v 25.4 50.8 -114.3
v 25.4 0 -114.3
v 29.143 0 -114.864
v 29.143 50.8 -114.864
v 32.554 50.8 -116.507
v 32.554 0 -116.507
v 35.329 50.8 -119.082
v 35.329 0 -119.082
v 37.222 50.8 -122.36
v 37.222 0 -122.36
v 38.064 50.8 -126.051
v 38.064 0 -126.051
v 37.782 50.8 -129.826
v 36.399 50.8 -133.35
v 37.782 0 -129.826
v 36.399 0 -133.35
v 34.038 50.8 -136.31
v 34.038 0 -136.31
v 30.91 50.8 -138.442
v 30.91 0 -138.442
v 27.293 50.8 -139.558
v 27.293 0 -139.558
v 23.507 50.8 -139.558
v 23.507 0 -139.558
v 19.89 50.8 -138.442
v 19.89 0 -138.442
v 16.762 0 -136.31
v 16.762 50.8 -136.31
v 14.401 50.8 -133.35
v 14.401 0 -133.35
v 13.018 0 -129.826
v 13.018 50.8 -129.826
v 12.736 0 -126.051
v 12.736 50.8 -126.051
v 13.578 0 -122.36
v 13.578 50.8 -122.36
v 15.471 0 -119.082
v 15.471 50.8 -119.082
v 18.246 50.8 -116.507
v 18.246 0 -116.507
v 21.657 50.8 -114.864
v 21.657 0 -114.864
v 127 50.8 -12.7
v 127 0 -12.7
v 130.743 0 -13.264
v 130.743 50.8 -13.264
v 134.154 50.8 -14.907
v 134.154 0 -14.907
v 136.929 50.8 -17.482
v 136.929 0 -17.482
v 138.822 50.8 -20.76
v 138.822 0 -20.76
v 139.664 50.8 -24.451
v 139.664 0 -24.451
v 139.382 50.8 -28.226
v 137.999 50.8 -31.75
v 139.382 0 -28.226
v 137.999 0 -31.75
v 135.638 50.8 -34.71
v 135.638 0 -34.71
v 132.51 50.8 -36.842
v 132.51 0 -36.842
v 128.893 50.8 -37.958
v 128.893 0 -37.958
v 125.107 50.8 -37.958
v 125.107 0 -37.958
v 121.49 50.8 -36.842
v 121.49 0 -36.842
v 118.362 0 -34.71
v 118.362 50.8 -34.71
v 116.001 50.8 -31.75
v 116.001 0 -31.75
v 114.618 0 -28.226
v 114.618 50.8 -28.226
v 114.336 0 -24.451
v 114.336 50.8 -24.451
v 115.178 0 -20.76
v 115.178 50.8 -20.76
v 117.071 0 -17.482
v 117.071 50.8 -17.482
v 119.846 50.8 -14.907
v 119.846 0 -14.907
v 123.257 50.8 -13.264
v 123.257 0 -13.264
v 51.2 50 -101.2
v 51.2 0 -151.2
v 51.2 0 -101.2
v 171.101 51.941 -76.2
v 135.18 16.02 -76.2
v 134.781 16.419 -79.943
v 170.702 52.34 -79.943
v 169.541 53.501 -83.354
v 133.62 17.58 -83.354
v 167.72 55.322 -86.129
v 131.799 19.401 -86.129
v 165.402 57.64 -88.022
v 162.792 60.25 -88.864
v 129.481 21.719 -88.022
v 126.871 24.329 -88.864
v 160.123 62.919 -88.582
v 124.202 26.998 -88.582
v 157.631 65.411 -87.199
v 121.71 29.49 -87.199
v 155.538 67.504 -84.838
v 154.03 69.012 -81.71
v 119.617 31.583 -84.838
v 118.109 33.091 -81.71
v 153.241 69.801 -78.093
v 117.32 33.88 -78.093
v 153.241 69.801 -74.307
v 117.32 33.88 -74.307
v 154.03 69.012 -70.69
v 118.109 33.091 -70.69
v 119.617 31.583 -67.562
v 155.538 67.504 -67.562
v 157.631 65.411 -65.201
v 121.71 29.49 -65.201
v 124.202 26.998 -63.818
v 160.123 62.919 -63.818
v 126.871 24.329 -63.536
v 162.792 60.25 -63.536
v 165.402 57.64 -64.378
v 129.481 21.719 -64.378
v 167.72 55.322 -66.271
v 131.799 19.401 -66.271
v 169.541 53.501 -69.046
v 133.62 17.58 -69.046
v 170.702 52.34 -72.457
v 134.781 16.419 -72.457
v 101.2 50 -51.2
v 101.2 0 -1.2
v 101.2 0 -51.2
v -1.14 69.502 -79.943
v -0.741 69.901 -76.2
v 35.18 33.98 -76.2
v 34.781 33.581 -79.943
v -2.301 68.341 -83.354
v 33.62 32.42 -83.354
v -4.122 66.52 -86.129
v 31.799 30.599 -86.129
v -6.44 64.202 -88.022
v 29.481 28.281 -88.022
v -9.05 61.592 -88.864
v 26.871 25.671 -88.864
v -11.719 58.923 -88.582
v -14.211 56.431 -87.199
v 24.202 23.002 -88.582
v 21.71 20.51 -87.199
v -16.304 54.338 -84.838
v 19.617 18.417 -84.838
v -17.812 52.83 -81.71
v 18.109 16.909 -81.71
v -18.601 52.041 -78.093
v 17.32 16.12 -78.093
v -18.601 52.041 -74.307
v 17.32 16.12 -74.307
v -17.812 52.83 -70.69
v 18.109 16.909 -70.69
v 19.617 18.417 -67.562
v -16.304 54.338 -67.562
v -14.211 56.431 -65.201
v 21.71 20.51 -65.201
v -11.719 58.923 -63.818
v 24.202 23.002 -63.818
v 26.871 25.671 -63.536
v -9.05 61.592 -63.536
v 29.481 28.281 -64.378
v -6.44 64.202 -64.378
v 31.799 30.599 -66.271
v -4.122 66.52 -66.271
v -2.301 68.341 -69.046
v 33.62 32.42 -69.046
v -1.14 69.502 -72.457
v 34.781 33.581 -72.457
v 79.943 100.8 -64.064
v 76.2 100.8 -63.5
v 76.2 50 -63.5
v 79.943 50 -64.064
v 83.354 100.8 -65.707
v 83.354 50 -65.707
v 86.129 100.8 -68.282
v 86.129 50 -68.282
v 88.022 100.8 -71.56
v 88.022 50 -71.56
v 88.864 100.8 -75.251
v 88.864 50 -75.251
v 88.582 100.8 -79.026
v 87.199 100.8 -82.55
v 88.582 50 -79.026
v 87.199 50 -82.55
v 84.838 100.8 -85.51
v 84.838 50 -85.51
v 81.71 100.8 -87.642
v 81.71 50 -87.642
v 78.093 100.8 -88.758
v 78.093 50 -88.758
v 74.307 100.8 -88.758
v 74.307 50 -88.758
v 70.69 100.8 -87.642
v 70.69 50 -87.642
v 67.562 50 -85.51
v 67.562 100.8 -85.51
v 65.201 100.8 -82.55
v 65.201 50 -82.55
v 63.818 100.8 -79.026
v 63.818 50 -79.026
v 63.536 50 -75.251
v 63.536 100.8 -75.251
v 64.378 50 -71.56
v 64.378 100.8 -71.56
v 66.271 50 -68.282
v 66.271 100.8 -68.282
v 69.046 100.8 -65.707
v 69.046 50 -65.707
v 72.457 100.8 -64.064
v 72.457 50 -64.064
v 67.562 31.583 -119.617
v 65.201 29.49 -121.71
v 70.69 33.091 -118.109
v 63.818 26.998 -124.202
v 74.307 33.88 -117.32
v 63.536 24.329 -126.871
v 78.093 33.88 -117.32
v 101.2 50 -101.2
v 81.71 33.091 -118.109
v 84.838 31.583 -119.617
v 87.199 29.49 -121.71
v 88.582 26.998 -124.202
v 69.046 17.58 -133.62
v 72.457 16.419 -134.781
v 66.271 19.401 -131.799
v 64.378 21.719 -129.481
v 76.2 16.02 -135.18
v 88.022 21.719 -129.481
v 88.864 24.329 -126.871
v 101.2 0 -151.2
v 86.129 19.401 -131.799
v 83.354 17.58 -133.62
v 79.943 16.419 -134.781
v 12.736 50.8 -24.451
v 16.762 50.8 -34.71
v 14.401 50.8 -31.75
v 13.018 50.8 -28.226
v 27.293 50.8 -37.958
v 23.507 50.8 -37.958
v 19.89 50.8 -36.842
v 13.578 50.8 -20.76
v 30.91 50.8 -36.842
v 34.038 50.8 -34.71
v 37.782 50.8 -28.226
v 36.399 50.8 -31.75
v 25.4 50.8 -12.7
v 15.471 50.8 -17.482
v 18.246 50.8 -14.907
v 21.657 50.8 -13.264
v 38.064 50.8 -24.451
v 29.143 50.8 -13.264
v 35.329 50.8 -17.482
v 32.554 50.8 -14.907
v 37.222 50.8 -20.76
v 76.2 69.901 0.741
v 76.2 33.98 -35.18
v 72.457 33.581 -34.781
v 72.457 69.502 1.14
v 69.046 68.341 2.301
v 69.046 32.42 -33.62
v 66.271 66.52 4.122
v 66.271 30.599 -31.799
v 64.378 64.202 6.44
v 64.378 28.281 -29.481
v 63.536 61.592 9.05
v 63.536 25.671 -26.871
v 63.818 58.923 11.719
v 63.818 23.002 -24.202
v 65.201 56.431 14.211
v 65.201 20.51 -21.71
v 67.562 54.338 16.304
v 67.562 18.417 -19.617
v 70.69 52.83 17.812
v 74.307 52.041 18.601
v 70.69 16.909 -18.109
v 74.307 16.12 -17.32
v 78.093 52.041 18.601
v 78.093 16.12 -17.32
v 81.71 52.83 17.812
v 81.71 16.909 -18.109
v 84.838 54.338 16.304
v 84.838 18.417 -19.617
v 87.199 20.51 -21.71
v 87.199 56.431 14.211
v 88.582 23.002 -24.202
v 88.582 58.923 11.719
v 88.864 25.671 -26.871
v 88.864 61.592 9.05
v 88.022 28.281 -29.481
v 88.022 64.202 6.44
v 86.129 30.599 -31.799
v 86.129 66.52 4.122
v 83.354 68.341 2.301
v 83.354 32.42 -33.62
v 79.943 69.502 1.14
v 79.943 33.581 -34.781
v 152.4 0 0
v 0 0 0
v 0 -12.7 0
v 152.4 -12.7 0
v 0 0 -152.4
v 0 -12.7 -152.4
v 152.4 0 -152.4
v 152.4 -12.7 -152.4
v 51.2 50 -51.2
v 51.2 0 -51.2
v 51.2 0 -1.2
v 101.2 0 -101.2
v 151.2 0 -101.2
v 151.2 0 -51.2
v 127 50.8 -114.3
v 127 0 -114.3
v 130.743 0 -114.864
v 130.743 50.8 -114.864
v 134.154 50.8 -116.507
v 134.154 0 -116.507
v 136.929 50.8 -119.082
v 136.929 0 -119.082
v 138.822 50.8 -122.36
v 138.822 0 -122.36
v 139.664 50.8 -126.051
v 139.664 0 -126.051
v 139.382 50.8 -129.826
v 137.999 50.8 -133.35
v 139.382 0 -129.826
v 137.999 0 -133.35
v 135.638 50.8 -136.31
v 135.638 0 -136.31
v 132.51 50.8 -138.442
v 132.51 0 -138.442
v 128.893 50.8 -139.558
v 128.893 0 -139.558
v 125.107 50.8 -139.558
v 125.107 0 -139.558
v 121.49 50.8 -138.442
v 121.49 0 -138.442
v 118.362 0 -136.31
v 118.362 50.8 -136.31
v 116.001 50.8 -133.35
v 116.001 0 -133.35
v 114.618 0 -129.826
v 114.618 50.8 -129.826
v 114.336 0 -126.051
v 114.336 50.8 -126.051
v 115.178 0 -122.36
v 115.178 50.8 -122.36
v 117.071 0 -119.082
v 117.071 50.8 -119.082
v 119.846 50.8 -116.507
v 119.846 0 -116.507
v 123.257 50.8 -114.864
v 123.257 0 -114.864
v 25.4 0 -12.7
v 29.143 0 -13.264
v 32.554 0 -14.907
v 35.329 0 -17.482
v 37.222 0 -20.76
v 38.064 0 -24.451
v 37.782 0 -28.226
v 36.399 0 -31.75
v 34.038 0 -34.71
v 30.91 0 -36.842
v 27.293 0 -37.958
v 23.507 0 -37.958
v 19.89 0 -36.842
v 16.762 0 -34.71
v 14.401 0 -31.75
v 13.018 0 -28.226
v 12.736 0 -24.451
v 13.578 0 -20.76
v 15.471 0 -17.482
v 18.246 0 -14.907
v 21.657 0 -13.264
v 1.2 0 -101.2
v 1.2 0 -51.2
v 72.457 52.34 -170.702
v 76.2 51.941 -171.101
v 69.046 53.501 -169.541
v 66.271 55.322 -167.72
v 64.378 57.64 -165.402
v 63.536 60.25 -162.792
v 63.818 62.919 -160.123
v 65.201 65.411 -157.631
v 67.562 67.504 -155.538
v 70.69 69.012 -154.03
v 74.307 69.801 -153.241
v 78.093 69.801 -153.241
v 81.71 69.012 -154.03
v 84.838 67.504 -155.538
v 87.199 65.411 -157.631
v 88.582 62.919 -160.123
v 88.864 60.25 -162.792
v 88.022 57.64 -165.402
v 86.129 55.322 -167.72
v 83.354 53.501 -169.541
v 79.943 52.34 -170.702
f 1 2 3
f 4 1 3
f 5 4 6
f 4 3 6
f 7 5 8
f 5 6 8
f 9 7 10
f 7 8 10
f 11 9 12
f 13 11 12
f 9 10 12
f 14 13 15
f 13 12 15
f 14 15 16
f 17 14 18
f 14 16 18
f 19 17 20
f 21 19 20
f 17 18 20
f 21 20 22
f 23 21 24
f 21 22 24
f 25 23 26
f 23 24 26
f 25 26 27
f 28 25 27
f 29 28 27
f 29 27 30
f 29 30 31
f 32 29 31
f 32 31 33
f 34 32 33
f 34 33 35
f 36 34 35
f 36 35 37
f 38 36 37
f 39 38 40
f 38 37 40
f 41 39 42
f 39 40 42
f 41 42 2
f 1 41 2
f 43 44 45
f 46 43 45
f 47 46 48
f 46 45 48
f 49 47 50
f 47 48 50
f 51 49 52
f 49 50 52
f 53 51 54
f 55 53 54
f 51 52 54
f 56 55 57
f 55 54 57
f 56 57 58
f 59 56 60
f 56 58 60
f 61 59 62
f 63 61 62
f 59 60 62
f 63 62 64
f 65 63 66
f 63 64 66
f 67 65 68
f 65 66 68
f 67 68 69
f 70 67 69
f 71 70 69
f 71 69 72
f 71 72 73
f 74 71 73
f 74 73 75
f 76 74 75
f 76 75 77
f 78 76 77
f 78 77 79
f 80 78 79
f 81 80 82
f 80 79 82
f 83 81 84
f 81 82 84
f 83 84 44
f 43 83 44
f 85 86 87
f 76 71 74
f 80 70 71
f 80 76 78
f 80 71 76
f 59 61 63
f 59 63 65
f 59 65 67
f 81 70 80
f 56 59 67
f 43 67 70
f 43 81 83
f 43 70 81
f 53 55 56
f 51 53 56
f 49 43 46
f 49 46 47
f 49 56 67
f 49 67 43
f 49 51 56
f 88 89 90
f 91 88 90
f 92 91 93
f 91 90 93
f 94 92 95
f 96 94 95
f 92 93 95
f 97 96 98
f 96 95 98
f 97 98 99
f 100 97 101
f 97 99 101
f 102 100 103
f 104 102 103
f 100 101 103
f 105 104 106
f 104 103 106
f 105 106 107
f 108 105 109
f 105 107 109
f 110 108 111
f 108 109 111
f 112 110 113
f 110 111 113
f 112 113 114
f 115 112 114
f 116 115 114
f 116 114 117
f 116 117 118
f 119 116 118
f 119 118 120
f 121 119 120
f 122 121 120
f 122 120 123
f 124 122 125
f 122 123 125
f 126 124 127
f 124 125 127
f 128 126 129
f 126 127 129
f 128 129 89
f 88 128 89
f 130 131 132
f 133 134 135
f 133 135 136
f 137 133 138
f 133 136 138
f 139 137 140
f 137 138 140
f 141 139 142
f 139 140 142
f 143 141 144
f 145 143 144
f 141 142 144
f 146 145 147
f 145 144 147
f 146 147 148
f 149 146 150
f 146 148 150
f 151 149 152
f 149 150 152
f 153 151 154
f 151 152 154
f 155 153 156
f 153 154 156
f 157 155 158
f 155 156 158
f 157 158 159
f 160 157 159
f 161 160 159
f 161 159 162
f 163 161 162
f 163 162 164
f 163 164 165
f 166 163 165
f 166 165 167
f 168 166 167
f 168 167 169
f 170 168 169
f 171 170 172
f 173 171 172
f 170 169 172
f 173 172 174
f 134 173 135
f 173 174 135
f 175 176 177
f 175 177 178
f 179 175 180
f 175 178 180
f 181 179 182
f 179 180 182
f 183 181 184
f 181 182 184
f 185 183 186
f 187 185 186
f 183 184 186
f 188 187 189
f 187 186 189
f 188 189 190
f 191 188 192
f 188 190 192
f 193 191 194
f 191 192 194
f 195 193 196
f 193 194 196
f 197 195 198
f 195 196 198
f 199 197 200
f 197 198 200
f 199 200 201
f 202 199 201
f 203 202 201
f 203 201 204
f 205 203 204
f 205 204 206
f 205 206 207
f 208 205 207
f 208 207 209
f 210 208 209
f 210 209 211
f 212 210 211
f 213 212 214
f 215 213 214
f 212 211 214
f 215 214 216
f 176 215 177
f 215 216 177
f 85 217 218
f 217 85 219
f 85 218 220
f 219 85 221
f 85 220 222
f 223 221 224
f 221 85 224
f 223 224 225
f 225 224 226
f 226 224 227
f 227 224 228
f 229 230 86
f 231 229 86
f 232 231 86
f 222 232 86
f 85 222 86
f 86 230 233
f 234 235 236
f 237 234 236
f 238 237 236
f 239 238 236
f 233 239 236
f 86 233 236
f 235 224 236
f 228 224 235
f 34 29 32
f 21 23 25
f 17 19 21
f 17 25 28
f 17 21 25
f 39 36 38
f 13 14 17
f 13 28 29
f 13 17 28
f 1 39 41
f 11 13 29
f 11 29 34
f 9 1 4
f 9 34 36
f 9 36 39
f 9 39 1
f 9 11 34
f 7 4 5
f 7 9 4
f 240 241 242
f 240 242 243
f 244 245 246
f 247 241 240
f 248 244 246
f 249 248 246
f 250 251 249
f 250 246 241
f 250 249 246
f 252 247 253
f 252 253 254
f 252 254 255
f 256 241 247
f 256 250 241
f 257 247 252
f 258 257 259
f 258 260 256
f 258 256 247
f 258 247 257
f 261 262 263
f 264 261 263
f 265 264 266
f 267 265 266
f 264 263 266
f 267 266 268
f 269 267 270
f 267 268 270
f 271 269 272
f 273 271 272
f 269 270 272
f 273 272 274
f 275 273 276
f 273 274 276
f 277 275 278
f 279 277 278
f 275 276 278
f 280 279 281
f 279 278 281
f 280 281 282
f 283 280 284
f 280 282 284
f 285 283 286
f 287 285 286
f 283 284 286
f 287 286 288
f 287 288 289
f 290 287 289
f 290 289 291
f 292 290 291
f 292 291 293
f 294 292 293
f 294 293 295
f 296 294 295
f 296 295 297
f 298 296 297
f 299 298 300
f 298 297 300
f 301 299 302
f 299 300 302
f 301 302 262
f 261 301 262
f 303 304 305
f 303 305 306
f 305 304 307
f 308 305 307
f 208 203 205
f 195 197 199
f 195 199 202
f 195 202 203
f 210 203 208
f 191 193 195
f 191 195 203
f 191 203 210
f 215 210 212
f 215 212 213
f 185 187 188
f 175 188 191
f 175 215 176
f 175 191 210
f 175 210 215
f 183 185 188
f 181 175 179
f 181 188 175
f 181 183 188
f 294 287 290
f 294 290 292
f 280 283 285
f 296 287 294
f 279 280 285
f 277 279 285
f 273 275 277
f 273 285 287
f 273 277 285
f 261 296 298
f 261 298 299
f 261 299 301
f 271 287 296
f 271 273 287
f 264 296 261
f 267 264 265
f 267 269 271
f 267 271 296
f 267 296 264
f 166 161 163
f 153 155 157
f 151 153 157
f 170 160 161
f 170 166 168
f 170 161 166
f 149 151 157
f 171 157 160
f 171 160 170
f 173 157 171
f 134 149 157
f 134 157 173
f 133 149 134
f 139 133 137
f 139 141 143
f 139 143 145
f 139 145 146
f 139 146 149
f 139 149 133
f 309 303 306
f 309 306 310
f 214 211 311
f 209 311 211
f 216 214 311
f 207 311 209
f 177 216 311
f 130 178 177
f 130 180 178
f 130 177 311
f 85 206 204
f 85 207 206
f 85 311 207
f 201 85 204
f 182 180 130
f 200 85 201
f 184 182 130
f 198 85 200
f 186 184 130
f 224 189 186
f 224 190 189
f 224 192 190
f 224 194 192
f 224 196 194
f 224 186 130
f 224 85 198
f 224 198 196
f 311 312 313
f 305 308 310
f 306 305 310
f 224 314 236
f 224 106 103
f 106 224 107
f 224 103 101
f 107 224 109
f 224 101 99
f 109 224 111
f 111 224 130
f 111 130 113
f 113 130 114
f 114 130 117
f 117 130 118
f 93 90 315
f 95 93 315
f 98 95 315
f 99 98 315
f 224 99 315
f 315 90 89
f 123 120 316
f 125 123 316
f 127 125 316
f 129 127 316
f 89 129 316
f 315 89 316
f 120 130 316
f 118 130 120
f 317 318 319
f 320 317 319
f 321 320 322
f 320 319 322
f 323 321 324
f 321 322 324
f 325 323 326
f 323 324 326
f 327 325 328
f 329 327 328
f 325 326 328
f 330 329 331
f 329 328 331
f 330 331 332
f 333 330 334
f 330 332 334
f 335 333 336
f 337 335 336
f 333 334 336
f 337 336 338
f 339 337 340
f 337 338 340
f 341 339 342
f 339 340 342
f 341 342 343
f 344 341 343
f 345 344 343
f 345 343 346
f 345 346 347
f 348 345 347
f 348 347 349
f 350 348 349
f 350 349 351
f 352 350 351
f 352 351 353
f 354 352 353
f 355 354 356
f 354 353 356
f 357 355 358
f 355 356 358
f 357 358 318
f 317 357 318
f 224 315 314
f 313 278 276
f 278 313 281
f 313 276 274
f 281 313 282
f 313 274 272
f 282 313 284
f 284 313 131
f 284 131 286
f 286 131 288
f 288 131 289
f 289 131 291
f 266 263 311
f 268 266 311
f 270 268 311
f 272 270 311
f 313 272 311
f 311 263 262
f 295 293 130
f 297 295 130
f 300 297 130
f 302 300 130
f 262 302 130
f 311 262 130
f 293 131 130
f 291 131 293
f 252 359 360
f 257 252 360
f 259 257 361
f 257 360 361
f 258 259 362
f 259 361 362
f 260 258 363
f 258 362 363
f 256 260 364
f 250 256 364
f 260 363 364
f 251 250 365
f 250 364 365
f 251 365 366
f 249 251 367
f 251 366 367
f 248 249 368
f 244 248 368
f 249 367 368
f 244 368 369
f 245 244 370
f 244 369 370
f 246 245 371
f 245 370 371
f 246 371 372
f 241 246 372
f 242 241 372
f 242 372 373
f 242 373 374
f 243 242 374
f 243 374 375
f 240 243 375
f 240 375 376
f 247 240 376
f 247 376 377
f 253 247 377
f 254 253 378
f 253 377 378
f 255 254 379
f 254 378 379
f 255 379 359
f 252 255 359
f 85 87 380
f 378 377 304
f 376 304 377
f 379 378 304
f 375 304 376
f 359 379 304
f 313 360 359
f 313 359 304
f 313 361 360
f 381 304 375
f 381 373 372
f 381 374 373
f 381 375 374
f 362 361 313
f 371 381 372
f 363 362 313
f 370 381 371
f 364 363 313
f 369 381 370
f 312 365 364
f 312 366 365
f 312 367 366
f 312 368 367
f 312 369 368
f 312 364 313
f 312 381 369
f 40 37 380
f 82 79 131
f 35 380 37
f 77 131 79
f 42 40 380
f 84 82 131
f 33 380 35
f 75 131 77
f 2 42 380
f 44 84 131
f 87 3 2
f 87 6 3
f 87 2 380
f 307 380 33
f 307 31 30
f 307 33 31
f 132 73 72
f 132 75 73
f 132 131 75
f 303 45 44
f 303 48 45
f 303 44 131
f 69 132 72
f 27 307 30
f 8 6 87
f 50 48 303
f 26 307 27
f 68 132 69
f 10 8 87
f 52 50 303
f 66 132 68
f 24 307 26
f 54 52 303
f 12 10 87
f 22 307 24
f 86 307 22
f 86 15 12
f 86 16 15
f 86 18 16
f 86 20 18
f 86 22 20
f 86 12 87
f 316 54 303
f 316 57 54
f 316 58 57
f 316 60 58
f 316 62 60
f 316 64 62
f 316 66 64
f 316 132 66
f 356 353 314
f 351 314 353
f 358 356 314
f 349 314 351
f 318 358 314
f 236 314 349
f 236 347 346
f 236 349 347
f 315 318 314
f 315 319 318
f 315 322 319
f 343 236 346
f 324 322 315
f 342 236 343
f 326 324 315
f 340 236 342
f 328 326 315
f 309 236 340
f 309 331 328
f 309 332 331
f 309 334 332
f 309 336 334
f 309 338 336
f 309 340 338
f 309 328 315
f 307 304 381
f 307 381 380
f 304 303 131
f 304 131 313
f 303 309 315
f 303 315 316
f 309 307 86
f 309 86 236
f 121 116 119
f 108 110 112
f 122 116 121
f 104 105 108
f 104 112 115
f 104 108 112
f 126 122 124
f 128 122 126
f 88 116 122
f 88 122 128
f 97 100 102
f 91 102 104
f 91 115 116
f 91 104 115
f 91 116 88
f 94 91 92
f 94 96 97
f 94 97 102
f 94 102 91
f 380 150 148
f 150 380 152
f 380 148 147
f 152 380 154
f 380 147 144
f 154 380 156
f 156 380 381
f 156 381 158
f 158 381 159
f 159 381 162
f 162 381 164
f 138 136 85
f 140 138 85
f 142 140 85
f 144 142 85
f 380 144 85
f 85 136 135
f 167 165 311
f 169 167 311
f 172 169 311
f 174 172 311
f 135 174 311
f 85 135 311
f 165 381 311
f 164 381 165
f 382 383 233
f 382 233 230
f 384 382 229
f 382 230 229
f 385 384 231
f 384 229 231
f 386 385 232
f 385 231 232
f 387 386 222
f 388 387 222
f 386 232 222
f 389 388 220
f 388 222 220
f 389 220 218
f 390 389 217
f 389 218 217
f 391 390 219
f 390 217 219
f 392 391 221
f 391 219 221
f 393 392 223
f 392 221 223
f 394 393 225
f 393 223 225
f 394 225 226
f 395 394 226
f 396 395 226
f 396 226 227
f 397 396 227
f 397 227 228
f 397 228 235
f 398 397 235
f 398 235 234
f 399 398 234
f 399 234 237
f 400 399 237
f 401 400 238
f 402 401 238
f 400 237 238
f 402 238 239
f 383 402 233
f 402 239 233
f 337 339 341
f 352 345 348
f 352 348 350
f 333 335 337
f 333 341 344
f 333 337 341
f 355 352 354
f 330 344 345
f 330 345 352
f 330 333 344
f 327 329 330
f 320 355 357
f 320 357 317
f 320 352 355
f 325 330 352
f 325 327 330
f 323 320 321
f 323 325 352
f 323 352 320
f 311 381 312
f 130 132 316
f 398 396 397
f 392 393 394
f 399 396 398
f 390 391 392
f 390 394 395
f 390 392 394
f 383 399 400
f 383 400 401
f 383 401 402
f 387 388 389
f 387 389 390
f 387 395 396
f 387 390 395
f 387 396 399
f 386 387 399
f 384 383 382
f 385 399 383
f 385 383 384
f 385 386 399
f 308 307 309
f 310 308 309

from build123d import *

# Parameters (mm, degrees)
SKETCH1_W           = 152.4
SKETCH1_H           = 152.4
BOSS_EXTRUDE1_DEPTH = 12.7
SKETCH2_R           = 12.7
BOSS_EXTRUDE2_DEPTH = 50.8
BOSS_EXTRUDE3_DEPTH = 50
CUT_EXTRUDE1_DEPTH  = 50
CUT_EXTRUDE2_DEPTH  = 50
SKETCH6_R           = 12.7
BOSS_EXTRUDE4_DEPTH = 50.8
SKETCH7_R           = 12.7
BOSS_EXTRUDE5_DEPTH = 50.8
SKETCH8_R           = 12.7
BOSS_EXTRUDE6_DEPTH = 50.8
SKETCH9_R           = 12.7
BOSS_EXTRUDE7_DEPTH = 50.8
SKETCH10_R          = 12.7
BOSS_EXTRUDE8_DEPTH = 50.8


with BuildPart() as part:
    # Sketch1 → Boss-Extrude1 (new body)
    with BuildSketch(Plane(origin=(0, 0, 0), x_dir=(1, 0, 0), z_dir=(0, 1, 0))):
        with Locations((76.2, 76.2)):
            Rectangle(SKETCH1_W, SKETCH1_H)
    extrude(amount=-BOSS_EXTRUDE1_DEPTH)

    # Sketch2 → Boss-Extrude2 (add)
    with BuildSketch(Plane(origin=(0, 0, 0), x_dir=(1, 0, 0), z_dir=(0, 1, 0))):
        with Locations(Location((25.4, 127, 0), (0, 0, 270))):
            Circle(SKETCH2_R)
        with Locations(Location((127, 127, 0), (0, 0, 270))):
            Circle(SKETCH2_R)
        with Locations(Location((127, 25.4, 0), (0, 0, 270))):
            Circle(SKETCH2_R)
        with Locations(Location((25.4, 25.4, 0), (0, 0, 270))):
            Circle(SKETCH2_R)
    extrude(amount=BOSS_EXTRUDE2_DEPTH)

    # Sketch3 → Boss-Extrude3 (add)
    with BuildSketch(Plane(origin=(0, 0, 0), x_dir=(1, 0, 0), z_dir=(0, 1, 0))):
        Polygon((51.2, 151.2), (51.2, 101.2), (1.2, 101.2), (1.2, 51.2), (51.2, 51.2), (51.2, 1.2), (101.2, 1.2), (101.2, 51.2), (151.2, 51.2), (151.2, 101.2), (101.2, 101.2), (101.2, 151.2), align=None)
    extrude(amount=BOSS_EXTRUDE3_DEPTH)

    # Sketch4 → Cut-Extrude1 (cut)
    with BuildSketch(Plane.XY.offset(-51.2)):
        Polygon((1.2, 0), (51.2, 50), (1.2, 50), align=None)
        Polygon((101.2, 50), (151.2, 0), (151.2, 50), align=None)
    extrude(amount=-CUT_EXTRUDE1_DEPTH, mode=Mode.SUBTRACT)

    # Sketch5 → Cut-Extrude2 (cut)
    with BuildSketch(Plane(origin=(101.2, 0, 0), x_dir=(0, 0, -1), z_dir=(1, 0, 0))):
        Polygon((1.2, 0), (51.2, 50), (1.2, 50), align=None)
        Polygon((101.2, 50), (151.2, 0), (151.2, 50), align=None)
    extrude(amount=-CUT_EXTRUDE2_DEPTH, mode=Mode.SUBTRACT)

    # Sketch6 → Boss-Extrude4 (add)
    with BuildSketch(Plane(origin=(75.6, 75.6, 0), x_dir=(0, 0, -1), z_dir=(0.7071067811865475, 0.7071067811865477, 0))):
        with Locations(Location((76.2, -71.559206256, 0), (0, 0, 270))):
            Circle(SKETCH6_R)
    extrude(amount=BOSS_EXTRUDE4_DEPTH)

    # Sketch7 → Boss-Extrude5 (add)
    with BuildSketch(Plane(origin=(0, 75.6, -75.6), x_dir=(1, 0, 0), z_dir=(0, 0.7071067811865476, -0.7071067811865475))):
        with Locations(Location((76.2, 71.559206256, 0), (0, 0, 90))):
            Circle(SKETCH7_R)
    extrude(amount=BOSS_EXTRUDE5_DEPTH)

    # Sketch8 → Boss-Extrude6 (add)
    with BuildSketch(Plane(origin=(0.6, -0.6, 0), x_dir=(0, 0, 1), z_dir=(-0.7071067811865476, 0.7071067811865475, 0))):
        with Locations(Location((-76.2, 36.203867197, 0), (0, 0, 90))):
            Circle(SKETCH8_R)
    extrude(amount=BOSS_EXTRUDE6_DEPTH)

    # Sketch9 → Boss-Extrude7 (add)
    with BuildSketch(Plane(origin=(0, -0.6, -0.6), x_dir=(1, 0, 0), z_dir=(0, 0.7071067811865477, 0.7071067811865475))):
        with Locations(Location((76.2, 36.203867197, 0), (0, 0, 90))):
            Circle(SKETCH9_R)
    extrude(amount=BOSS_EXTRUDE7_DEPTH)

    # Sketch10 → Boss-Extrude8 (add)
    with BuildSketch(Plane(origin=(0, 50, 0), x_dir=(1, 0, 0), z_dir=(0, 1, 0))):
        with Locations(Location((76.2, 76.2, 0), (0, 0, 270))):
            Circle(SKETCH10_R)
    extrude(amount=BOSS_EXTRUDE8_DEPTH)


solid = part.part
